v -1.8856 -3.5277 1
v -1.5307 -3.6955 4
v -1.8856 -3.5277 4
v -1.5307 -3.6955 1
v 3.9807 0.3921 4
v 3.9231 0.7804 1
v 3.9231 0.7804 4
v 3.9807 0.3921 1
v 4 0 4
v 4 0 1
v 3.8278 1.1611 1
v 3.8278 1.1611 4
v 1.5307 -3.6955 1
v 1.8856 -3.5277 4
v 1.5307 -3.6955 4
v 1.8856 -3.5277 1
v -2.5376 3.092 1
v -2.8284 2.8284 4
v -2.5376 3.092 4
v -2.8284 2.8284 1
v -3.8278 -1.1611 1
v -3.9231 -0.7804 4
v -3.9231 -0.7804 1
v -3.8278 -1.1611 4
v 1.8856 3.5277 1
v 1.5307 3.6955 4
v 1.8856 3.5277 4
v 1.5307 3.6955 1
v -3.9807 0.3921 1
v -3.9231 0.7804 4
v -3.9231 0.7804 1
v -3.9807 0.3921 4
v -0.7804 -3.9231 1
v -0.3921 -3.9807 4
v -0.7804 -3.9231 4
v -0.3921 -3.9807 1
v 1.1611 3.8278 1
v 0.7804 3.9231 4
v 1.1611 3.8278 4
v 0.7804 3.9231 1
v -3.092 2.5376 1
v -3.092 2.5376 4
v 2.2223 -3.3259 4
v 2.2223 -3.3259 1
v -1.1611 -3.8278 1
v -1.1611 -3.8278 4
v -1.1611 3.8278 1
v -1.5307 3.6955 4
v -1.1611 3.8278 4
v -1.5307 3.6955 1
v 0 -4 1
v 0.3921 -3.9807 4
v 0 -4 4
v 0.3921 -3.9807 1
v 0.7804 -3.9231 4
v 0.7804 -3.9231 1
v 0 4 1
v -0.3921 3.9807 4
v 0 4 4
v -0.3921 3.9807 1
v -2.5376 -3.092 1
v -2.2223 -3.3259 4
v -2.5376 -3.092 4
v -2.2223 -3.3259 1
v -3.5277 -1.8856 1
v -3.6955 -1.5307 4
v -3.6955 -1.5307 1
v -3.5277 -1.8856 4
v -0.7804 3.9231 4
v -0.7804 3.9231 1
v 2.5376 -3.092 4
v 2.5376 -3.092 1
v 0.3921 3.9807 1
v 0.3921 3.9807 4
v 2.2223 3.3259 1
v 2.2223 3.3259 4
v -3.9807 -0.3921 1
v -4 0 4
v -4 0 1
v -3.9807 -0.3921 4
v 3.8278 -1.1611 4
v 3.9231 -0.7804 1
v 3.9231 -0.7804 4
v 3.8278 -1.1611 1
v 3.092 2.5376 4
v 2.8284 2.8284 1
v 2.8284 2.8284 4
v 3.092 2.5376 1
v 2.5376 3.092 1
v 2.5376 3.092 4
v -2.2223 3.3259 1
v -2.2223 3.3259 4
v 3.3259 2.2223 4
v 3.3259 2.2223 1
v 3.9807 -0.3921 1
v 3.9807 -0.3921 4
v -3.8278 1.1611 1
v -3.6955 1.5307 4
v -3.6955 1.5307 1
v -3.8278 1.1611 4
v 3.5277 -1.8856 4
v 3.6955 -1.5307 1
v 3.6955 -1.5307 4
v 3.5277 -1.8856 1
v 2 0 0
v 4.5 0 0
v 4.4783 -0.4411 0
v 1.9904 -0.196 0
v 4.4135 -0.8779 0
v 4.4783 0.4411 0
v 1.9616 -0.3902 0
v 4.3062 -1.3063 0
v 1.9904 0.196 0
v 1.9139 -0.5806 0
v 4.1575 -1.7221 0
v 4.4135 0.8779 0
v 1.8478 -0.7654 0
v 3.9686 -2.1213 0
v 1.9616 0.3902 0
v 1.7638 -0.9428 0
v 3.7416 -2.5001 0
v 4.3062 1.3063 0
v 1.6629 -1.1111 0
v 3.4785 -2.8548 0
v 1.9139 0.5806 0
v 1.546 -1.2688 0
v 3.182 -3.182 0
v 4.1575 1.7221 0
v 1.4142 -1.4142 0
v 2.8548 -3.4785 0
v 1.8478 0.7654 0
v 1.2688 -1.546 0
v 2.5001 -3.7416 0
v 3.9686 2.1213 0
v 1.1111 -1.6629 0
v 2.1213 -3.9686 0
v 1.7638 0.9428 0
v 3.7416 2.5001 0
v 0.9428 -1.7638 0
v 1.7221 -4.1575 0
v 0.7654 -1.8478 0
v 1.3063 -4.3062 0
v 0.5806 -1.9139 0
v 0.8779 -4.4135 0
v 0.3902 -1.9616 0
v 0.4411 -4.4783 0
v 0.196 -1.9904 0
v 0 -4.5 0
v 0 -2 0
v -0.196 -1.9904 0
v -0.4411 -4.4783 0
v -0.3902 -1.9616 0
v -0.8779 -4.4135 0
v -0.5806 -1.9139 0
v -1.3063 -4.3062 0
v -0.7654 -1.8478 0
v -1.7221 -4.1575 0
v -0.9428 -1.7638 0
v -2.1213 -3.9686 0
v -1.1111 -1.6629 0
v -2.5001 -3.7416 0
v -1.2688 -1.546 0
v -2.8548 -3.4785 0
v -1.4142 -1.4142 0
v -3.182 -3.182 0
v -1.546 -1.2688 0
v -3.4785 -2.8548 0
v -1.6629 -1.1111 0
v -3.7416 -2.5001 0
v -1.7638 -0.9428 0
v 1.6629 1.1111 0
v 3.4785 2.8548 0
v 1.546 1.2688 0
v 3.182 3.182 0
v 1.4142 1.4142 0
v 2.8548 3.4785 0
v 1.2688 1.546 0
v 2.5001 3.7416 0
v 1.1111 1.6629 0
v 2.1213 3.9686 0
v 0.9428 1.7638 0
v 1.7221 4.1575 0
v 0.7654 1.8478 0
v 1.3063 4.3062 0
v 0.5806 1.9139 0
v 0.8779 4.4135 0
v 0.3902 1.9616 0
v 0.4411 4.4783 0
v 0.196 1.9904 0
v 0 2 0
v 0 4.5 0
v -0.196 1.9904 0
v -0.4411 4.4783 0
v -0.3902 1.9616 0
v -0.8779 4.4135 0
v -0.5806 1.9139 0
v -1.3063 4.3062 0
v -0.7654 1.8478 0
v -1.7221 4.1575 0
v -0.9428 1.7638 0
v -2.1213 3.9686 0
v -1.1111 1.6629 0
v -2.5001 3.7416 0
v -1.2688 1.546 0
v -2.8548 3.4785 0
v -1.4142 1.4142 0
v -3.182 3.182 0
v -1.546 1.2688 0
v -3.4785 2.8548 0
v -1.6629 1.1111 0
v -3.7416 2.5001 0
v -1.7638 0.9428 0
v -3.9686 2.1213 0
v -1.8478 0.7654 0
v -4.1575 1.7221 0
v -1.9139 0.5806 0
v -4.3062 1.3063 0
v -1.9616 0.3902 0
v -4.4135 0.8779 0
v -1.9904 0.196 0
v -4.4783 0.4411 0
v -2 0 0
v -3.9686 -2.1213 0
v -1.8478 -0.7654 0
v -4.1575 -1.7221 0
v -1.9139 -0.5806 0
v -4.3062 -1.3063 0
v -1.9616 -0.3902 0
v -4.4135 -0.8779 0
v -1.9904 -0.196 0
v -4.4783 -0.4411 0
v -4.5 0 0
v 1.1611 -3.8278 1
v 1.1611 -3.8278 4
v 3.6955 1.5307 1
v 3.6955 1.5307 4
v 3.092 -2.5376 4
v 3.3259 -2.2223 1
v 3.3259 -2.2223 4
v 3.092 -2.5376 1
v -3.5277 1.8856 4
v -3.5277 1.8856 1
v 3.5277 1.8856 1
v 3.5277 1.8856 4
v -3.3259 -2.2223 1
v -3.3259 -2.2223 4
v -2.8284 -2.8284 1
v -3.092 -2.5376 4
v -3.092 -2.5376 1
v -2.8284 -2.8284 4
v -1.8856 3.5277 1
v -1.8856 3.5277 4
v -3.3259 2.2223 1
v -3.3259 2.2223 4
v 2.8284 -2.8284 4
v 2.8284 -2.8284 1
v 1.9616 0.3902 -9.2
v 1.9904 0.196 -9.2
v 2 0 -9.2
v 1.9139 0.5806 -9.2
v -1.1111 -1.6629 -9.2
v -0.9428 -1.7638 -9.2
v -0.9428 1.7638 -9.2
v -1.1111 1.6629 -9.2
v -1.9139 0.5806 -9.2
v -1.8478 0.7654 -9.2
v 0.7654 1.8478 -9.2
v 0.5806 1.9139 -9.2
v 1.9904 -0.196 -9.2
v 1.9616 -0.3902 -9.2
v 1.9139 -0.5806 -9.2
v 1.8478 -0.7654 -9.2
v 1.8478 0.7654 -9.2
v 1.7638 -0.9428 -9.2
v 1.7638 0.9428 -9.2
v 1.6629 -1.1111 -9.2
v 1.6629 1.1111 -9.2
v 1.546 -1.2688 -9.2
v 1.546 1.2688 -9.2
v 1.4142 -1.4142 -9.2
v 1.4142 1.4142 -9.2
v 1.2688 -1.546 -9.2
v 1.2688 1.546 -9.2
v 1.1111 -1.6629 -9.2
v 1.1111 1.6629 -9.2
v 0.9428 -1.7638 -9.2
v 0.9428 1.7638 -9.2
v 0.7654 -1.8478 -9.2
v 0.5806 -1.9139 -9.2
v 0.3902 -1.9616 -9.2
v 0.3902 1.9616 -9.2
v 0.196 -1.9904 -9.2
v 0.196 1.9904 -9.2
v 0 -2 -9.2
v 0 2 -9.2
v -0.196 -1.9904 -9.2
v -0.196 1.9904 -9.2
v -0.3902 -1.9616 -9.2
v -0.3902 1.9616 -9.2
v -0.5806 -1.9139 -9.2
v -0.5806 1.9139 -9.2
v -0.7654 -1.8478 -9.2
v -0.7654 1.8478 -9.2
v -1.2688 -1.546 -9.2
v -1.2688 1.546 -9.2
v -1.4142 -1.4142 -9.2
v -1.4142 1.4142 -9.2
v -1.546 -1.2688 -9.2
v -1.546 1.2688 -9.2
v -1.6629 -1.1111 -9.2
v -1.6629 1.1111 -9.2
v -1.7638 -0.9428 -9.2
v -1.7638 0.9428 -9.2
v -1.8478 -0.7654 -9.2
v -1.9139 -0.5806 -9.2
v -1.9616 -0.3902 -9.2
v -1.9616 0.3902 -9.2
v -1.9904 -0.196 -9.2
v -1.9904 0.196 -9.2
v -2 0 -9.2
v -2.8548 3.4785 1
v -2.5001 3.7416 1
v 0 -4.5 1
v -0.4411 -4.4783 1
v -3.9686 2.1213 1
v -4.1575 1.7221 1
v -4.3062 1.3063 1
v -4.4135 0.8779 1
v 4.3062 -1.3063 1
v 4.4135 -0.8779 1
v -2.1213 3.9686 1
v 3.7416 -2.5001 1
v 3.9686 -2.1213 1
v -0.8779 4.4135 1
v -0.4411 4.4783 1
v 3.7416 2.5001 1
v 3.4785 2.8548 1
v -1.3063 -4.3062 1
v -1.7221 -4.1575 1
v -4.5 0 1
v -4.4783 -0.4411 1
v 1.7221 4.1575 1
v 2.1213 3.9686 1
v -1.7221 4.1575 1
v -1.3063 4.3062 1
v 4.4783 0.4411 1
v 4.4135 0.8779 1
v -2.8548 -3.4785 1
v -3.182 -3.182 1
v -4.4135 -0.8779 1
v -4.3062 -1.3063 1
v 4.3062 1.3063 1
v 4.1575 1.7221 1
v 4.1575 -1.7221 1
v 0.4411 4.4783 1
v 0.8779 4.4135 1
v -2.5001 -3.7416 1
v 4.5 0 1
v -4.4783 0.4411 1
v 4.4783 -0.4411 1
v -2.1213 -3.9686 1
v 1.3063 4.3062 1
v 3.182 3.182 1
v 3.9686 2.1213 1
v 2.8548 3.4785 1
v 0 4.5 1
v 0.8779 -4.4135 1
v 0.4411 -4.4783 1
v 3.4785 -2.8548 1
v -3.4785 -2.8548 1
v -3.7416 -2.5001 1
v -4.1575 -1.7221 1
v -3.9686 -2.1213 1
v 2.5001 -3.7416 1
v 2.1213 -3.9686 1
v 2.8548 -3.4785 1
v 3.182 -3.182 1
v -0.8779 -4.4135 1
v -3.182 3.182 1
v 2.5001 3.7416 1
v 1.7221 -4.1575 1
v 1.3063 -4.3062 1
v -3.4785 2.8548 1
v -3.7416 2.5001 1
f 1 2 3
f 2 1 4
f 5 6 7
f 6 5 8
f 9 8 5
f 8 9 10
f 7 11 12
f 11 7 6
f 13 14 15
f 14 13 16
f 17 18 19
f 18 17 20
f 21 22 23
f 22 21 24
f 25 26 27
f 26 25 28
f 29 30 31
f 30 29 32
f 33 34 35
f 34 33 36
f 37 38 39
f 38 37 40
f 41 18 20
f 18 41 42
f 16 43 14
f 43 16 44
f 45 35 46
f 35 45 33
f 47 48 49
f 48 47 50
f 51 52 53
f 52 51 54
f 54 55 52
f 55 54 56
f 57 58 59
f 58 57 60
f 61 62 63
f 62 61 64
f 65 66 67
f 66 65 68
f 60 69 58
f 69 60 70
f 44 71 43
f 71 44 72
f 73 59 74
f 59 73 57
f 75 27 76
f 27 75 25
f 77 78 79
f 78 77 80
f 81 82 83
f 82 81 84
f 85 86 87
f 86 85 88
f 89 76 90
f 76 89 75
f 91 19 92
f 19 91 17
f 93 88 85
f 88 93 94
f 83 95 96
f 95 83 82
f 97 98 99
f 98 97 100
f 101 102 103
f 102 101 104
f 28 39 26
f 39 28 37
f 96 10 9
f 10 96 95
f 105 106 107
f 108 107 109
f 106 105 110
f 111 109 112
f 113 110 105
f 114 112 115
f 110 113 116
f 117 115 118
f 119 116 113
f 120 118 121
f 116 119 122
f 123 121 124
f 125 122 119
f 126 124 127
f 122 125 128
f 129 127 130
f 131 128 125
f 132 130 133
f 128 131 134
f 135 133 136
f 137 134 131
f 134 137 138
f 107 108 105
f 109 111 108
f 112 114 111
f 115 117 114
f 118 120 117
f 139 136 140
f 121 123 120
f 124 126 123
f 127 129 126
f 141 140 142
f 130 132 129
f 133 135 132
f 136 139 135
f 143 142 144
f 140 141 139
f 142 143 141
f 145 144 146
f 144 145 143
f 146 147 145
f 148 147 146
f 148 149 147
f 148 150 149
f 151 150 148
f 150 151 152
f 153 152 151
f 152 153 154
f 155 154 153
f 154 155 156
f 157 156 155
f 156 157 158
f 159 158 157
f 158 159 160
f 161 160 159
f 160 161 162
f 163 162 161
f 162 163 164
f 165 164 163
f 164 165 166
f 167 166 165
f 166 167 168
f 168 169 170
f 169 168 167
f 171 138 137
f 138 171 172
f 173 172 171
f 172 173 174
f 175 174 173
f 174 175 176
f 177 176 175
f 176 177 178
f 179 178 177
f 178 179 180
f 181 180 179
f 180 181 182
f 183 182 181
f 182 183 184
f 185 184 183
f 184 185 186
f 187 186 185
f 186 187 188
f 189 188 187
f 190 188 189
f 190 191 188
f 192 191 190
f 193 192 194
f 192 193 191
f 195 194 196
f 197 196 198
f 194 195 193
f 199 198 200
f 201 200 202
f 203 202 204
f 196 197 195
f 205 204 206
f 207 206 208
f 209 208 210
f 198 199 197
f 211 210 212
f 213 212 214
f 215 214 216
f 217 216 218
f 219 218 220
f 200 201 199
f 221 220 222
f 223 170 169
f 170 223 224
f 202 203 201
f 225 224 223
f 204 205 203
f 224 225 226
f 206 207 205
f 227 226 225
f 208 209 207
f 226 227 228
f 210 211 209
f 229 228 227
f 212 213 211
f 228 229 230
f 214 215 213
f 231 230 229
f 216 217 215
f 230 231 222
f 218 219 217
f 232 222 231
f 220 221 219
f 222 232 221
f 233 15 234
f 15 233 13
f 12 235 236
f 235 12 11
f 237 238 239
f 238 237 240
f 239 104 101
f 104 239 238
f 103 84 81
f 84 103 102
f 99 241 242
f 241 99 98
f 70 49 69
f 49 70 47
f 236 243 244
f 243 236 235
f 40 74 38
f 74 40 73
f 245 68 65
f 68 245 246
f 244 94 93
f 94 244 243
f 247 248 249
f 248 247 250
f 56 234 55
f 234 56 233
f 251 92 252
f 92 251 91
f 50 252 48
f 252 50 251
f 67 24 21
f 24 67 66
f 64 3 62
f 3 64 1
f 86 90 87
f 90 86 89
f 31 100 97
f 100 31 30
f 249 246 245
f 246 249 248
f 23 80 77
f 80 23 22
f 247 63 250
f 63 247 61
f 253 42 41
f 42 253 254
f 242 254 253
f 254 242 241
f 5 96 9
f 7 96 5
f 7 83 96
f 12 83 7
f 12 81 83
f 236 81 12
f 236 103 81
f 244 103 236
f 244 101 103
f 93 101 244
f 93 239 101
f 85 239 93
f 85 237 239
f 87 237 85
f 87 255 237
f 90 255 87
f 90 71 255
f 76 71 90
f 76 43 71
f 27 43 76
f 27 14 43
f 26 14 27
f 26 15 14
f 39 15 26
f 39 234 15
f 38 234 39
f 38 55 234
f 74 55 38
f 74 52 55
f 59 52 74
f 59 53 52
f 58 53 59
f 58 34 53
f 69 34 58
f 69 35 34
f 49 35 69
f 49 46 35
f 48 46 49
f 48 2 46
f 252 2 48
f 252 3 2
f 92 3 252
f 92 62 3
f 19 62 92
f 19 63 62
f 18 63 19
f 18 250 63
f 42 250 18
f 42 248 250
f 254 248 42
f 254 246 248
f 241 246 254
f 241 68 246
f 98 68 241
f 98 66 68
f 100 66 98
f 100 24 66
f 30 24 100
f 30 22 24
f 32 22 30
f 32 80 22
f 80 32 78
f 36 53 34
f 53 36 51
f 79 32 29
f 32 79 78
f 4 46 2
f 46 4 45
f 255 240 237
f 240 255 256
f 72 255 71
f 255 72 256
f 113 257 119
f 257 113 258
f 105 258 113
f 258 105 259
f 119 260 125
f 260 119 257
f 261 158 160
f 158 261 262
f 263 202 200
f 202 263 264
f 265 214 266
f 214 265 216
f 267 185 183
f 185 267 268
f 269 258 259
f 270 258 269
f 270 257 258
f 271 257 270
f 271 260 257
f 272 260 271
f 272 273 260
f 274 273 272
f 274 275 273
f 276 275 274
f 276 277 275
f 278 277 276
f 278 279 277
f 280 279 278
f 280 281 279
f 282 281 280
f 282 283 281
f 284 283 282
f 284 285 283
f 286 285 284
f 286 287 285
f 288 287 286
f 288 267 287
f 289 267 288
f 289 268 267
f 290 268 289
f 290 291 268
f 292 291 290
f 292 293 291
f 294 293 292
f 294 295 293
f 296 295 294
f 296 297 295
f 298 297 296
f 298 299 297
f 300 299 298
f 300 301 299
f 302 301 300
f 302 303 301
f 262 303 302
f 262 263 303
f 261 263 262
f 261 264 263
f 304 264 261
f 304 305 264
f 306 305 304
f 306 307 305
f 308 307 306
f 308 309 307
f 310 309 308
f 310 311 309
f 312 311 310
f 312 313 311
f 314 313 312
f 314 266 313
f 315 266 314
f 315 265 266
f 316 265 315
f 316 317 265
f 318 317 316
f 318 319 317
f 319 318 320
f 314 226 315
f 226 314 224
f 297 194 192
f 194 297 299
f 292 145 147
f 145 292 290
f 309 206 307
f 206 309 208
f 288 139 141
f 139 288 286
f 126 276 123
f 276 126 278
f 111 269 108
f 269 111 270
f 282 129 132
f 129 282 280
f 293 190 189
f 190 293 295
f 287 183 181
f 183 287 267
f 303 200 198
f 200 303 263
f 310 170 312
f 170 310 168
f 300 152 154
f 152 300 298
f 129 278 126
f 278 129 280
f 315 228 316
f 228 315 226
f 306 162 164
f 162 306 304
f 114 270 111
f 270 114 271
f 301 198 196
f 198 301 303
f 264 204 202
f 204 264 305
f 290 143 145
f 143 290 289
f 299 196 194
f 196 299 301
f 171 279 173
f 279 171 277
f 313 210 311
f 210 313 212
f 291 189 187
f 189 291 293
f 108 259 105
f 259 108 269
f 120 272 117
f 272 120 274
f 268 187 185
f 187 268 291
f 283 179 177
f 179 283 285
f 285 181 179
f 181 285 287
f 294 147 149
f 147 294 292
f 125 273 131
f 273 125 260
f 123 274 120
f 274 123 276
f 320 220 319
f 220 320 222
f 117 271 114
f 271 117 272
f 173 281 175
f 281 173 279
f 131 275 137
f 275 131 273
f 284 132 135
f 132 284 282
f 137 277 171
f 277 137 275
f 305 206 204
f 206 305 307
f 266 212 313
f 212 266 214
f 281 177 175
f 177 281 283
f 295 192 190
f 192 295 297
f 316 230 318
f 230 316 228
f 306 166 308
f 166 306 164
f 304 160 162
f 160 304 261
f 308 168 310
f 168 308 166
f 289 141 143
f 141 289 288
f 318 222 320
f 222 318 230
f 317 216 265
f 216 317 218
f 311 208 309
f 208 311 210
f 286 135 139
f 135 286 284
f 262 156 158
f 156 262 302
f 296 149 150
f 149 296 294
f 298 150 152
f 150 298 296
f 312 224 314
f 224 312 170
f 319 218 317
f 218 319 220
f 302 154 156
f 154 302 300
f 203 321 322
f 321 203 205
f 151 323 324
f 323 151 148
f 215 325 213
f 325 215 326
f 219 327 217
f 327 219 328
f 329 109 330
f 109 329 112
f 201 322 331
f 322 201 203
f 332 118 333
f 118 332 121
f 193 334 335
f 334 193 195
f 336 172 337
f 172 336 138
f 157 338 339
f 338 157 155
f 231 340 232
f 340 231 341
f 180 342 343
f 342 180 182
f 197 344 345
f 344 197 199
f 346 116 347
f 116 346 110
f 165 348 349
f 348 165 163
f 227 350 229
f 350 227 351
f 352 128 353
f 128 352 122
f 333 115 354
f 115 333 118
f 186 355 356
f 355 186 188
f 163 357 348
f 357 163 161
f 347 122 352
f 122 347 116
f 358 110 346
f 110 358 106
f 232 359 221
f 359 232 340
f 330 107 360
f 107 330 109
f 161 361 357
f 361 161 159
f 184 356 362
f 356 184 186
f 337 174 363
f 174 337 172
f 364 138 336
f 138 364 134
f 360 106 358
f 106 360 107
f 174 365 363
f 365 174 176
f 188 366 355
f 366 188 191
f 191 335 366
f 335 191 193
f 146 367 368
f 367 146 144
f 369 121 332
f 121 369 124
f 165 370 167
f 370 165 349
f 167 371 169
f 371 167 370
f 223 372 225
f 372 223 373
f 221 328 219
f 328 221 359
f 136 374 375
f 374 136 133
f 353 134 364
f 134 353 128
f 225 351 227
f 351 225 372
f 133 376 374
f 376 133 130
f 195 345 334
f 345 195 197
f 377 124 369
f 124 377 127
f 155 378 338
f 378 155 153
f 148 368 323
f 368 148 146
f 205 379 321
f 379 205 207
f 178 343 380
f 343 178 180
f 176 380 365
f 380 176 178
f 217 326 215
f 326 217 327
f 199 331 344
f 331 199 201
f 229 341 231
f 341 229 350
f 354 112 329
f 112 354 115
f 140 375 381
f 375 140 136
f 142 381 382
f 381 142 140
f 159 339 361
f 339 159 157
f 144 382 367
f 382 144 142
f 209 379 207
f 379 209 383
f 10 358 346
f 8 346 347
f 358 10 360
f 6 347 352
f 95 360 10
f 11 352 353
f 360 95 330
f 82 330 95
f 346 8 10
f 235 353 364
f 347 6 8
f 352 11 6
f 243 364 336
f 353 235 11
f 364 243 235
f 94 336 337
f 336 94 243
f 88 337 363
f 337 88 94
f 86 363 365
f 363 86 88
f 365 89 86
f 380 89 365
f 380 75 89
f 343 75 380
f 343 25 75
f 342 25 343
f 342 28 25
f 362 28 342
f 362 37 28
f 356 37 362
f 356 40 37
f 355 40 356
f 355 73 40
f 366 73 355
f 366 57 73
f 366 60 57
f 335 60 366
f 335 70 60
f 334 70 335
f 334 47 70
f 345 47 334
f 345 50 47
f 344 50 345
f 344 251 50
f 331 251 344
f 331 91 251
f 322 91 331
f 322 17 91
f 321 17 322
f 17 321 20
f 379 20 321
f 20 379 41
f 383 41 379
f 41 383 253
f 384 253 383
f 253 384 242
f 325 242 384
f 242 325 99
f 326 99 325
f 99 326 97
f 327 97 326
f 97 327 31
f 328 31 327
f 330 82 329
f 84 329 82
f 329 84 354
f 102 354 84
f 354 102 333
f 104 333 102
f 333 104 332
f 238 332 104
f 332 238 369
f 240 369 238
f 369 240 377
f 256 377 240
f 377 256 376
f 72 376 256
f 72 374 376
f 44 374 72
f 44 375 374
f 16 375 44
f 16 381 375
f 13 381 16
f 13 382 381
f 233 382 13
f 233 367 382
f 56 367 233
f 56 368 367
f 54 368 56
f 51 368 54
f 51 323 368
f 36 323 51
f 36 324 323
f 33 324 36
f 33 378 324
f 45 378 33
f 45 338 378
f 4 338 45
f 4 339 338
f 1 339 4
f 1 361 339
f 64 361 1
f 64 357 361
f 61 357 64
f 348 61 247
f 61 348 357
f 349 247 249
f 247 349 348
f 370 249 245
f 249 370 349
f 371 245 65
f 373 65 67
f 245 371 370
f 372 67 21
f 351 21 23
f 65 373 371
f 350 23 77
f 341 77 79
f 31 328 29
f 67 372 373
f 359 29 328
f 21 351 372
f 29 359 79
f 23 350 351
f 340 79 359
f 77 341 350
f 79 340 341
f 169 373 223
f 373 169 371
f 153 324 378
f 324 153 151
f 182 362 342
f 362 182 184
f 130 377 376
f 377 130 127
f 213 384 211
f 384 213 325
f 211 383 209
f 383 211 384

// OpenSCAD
// Parameters
thread_diameter_mm = 4.0; //[2.0:8.0:0.1]
length_mm = 10.0; //[5.0:20.0:0.5]
head_diameter_mm = 8.0; //[6.0:16.0:0.1]
head_height_mm = 4.0; //[2.0:8.0:0.1]
socket_hex_af_mm = 3.0; //[2.0:6.0:0.1]
socket_depth_mm = 2.5; //[1.5:5.0:0.1]
thread_pitch_mm = 0.7; //[0.4:1.25:0.05]
thread_length_mm = 10.0; //[5.0:20.0:0.5]
shank_diameter_mm = 4.0; //[2.0:8.0:0.1]
head_to_shank_chamfer_height_mm = 0.8; //[0.4:1.6:0.05]
head_to_shank_chamfer_radius_delta_mm = 1.0; //[0.5:2.0:0.05]
thread_runout_length_mm = 1.4; //[0.7:3.0:0.1]
overlap_mm = 0.8; //[0.5:2.0:0.1]
washer_enabled = 1; //[0:1:1]
washer_outer_diameter_mm = 9.0; //[6.0:18.0:0.1]
washer_thickness_mm = 1.0; //[0.5:2.5:0.1]
washer_hole_diameter_mm = 4.5; //[4.1:6.0:0.1]

// Screw and Washer - complete geometry
module screw_and_washer() {
  color("DimGray") {
    // Cap Head
    translate([0, 0, head_height_mm/2])
      cylinder(r=head_diameter_mm/2, h=head_height_mm, center=true, $fn=64);
    
    // Threaded Shaft
    translate([0, 0, -length_mm/2 + overlap_mm])
      cylinder(r=shank_diameter_mm/2, h=length_mm, center=true, $fn=64);
    
    // Head to Shank Chamfer
    translate([0, 0, overlap_mm + head_to_shank_chamfer_height_mm/2])
      cylinder(r1=head_diameter_mm/2, r2=shank_diameter_mm/2, h=head_to_shank_chamfer_height_mm, center=true, $fn=64);
    
    // Thread Runout
    translate([0, 0, -thread_runout_length_mm/2 + overlap_mm])
      cylinder(r=shank_diameter_mm/2, h=thread_runout_length_mm, center=true, $fn=64);
    
    // Hex Socket
    translate([0, 0, head_height_mm - socket_depth_mm/2])
      difference() {
        cylinder(r=socket_hex_af_mm/(2*cos(30)), h=socket_depth_mm, center=true, $fn=6);
      }
  }
  
  if (washer_enabled) {
    color("Silver") {
      // Washer
      translate([0, 0, washer_thickness_mm/2])
        difference() {
          cylinder(r=washer_outer_diameter_mm/2, h=washer_thickness_mm, center=true, $fn=64);
          translate([0, 0, 0])
            cylinder(r=washer_hole_diameter_mm/2, h=washer_thickness_mm + 2*overlap_mm, center=true, $fn=64);
        }
    }
  }
}

// Assembly
module assembly() {
  screw_and_washer();
}

assembly();
